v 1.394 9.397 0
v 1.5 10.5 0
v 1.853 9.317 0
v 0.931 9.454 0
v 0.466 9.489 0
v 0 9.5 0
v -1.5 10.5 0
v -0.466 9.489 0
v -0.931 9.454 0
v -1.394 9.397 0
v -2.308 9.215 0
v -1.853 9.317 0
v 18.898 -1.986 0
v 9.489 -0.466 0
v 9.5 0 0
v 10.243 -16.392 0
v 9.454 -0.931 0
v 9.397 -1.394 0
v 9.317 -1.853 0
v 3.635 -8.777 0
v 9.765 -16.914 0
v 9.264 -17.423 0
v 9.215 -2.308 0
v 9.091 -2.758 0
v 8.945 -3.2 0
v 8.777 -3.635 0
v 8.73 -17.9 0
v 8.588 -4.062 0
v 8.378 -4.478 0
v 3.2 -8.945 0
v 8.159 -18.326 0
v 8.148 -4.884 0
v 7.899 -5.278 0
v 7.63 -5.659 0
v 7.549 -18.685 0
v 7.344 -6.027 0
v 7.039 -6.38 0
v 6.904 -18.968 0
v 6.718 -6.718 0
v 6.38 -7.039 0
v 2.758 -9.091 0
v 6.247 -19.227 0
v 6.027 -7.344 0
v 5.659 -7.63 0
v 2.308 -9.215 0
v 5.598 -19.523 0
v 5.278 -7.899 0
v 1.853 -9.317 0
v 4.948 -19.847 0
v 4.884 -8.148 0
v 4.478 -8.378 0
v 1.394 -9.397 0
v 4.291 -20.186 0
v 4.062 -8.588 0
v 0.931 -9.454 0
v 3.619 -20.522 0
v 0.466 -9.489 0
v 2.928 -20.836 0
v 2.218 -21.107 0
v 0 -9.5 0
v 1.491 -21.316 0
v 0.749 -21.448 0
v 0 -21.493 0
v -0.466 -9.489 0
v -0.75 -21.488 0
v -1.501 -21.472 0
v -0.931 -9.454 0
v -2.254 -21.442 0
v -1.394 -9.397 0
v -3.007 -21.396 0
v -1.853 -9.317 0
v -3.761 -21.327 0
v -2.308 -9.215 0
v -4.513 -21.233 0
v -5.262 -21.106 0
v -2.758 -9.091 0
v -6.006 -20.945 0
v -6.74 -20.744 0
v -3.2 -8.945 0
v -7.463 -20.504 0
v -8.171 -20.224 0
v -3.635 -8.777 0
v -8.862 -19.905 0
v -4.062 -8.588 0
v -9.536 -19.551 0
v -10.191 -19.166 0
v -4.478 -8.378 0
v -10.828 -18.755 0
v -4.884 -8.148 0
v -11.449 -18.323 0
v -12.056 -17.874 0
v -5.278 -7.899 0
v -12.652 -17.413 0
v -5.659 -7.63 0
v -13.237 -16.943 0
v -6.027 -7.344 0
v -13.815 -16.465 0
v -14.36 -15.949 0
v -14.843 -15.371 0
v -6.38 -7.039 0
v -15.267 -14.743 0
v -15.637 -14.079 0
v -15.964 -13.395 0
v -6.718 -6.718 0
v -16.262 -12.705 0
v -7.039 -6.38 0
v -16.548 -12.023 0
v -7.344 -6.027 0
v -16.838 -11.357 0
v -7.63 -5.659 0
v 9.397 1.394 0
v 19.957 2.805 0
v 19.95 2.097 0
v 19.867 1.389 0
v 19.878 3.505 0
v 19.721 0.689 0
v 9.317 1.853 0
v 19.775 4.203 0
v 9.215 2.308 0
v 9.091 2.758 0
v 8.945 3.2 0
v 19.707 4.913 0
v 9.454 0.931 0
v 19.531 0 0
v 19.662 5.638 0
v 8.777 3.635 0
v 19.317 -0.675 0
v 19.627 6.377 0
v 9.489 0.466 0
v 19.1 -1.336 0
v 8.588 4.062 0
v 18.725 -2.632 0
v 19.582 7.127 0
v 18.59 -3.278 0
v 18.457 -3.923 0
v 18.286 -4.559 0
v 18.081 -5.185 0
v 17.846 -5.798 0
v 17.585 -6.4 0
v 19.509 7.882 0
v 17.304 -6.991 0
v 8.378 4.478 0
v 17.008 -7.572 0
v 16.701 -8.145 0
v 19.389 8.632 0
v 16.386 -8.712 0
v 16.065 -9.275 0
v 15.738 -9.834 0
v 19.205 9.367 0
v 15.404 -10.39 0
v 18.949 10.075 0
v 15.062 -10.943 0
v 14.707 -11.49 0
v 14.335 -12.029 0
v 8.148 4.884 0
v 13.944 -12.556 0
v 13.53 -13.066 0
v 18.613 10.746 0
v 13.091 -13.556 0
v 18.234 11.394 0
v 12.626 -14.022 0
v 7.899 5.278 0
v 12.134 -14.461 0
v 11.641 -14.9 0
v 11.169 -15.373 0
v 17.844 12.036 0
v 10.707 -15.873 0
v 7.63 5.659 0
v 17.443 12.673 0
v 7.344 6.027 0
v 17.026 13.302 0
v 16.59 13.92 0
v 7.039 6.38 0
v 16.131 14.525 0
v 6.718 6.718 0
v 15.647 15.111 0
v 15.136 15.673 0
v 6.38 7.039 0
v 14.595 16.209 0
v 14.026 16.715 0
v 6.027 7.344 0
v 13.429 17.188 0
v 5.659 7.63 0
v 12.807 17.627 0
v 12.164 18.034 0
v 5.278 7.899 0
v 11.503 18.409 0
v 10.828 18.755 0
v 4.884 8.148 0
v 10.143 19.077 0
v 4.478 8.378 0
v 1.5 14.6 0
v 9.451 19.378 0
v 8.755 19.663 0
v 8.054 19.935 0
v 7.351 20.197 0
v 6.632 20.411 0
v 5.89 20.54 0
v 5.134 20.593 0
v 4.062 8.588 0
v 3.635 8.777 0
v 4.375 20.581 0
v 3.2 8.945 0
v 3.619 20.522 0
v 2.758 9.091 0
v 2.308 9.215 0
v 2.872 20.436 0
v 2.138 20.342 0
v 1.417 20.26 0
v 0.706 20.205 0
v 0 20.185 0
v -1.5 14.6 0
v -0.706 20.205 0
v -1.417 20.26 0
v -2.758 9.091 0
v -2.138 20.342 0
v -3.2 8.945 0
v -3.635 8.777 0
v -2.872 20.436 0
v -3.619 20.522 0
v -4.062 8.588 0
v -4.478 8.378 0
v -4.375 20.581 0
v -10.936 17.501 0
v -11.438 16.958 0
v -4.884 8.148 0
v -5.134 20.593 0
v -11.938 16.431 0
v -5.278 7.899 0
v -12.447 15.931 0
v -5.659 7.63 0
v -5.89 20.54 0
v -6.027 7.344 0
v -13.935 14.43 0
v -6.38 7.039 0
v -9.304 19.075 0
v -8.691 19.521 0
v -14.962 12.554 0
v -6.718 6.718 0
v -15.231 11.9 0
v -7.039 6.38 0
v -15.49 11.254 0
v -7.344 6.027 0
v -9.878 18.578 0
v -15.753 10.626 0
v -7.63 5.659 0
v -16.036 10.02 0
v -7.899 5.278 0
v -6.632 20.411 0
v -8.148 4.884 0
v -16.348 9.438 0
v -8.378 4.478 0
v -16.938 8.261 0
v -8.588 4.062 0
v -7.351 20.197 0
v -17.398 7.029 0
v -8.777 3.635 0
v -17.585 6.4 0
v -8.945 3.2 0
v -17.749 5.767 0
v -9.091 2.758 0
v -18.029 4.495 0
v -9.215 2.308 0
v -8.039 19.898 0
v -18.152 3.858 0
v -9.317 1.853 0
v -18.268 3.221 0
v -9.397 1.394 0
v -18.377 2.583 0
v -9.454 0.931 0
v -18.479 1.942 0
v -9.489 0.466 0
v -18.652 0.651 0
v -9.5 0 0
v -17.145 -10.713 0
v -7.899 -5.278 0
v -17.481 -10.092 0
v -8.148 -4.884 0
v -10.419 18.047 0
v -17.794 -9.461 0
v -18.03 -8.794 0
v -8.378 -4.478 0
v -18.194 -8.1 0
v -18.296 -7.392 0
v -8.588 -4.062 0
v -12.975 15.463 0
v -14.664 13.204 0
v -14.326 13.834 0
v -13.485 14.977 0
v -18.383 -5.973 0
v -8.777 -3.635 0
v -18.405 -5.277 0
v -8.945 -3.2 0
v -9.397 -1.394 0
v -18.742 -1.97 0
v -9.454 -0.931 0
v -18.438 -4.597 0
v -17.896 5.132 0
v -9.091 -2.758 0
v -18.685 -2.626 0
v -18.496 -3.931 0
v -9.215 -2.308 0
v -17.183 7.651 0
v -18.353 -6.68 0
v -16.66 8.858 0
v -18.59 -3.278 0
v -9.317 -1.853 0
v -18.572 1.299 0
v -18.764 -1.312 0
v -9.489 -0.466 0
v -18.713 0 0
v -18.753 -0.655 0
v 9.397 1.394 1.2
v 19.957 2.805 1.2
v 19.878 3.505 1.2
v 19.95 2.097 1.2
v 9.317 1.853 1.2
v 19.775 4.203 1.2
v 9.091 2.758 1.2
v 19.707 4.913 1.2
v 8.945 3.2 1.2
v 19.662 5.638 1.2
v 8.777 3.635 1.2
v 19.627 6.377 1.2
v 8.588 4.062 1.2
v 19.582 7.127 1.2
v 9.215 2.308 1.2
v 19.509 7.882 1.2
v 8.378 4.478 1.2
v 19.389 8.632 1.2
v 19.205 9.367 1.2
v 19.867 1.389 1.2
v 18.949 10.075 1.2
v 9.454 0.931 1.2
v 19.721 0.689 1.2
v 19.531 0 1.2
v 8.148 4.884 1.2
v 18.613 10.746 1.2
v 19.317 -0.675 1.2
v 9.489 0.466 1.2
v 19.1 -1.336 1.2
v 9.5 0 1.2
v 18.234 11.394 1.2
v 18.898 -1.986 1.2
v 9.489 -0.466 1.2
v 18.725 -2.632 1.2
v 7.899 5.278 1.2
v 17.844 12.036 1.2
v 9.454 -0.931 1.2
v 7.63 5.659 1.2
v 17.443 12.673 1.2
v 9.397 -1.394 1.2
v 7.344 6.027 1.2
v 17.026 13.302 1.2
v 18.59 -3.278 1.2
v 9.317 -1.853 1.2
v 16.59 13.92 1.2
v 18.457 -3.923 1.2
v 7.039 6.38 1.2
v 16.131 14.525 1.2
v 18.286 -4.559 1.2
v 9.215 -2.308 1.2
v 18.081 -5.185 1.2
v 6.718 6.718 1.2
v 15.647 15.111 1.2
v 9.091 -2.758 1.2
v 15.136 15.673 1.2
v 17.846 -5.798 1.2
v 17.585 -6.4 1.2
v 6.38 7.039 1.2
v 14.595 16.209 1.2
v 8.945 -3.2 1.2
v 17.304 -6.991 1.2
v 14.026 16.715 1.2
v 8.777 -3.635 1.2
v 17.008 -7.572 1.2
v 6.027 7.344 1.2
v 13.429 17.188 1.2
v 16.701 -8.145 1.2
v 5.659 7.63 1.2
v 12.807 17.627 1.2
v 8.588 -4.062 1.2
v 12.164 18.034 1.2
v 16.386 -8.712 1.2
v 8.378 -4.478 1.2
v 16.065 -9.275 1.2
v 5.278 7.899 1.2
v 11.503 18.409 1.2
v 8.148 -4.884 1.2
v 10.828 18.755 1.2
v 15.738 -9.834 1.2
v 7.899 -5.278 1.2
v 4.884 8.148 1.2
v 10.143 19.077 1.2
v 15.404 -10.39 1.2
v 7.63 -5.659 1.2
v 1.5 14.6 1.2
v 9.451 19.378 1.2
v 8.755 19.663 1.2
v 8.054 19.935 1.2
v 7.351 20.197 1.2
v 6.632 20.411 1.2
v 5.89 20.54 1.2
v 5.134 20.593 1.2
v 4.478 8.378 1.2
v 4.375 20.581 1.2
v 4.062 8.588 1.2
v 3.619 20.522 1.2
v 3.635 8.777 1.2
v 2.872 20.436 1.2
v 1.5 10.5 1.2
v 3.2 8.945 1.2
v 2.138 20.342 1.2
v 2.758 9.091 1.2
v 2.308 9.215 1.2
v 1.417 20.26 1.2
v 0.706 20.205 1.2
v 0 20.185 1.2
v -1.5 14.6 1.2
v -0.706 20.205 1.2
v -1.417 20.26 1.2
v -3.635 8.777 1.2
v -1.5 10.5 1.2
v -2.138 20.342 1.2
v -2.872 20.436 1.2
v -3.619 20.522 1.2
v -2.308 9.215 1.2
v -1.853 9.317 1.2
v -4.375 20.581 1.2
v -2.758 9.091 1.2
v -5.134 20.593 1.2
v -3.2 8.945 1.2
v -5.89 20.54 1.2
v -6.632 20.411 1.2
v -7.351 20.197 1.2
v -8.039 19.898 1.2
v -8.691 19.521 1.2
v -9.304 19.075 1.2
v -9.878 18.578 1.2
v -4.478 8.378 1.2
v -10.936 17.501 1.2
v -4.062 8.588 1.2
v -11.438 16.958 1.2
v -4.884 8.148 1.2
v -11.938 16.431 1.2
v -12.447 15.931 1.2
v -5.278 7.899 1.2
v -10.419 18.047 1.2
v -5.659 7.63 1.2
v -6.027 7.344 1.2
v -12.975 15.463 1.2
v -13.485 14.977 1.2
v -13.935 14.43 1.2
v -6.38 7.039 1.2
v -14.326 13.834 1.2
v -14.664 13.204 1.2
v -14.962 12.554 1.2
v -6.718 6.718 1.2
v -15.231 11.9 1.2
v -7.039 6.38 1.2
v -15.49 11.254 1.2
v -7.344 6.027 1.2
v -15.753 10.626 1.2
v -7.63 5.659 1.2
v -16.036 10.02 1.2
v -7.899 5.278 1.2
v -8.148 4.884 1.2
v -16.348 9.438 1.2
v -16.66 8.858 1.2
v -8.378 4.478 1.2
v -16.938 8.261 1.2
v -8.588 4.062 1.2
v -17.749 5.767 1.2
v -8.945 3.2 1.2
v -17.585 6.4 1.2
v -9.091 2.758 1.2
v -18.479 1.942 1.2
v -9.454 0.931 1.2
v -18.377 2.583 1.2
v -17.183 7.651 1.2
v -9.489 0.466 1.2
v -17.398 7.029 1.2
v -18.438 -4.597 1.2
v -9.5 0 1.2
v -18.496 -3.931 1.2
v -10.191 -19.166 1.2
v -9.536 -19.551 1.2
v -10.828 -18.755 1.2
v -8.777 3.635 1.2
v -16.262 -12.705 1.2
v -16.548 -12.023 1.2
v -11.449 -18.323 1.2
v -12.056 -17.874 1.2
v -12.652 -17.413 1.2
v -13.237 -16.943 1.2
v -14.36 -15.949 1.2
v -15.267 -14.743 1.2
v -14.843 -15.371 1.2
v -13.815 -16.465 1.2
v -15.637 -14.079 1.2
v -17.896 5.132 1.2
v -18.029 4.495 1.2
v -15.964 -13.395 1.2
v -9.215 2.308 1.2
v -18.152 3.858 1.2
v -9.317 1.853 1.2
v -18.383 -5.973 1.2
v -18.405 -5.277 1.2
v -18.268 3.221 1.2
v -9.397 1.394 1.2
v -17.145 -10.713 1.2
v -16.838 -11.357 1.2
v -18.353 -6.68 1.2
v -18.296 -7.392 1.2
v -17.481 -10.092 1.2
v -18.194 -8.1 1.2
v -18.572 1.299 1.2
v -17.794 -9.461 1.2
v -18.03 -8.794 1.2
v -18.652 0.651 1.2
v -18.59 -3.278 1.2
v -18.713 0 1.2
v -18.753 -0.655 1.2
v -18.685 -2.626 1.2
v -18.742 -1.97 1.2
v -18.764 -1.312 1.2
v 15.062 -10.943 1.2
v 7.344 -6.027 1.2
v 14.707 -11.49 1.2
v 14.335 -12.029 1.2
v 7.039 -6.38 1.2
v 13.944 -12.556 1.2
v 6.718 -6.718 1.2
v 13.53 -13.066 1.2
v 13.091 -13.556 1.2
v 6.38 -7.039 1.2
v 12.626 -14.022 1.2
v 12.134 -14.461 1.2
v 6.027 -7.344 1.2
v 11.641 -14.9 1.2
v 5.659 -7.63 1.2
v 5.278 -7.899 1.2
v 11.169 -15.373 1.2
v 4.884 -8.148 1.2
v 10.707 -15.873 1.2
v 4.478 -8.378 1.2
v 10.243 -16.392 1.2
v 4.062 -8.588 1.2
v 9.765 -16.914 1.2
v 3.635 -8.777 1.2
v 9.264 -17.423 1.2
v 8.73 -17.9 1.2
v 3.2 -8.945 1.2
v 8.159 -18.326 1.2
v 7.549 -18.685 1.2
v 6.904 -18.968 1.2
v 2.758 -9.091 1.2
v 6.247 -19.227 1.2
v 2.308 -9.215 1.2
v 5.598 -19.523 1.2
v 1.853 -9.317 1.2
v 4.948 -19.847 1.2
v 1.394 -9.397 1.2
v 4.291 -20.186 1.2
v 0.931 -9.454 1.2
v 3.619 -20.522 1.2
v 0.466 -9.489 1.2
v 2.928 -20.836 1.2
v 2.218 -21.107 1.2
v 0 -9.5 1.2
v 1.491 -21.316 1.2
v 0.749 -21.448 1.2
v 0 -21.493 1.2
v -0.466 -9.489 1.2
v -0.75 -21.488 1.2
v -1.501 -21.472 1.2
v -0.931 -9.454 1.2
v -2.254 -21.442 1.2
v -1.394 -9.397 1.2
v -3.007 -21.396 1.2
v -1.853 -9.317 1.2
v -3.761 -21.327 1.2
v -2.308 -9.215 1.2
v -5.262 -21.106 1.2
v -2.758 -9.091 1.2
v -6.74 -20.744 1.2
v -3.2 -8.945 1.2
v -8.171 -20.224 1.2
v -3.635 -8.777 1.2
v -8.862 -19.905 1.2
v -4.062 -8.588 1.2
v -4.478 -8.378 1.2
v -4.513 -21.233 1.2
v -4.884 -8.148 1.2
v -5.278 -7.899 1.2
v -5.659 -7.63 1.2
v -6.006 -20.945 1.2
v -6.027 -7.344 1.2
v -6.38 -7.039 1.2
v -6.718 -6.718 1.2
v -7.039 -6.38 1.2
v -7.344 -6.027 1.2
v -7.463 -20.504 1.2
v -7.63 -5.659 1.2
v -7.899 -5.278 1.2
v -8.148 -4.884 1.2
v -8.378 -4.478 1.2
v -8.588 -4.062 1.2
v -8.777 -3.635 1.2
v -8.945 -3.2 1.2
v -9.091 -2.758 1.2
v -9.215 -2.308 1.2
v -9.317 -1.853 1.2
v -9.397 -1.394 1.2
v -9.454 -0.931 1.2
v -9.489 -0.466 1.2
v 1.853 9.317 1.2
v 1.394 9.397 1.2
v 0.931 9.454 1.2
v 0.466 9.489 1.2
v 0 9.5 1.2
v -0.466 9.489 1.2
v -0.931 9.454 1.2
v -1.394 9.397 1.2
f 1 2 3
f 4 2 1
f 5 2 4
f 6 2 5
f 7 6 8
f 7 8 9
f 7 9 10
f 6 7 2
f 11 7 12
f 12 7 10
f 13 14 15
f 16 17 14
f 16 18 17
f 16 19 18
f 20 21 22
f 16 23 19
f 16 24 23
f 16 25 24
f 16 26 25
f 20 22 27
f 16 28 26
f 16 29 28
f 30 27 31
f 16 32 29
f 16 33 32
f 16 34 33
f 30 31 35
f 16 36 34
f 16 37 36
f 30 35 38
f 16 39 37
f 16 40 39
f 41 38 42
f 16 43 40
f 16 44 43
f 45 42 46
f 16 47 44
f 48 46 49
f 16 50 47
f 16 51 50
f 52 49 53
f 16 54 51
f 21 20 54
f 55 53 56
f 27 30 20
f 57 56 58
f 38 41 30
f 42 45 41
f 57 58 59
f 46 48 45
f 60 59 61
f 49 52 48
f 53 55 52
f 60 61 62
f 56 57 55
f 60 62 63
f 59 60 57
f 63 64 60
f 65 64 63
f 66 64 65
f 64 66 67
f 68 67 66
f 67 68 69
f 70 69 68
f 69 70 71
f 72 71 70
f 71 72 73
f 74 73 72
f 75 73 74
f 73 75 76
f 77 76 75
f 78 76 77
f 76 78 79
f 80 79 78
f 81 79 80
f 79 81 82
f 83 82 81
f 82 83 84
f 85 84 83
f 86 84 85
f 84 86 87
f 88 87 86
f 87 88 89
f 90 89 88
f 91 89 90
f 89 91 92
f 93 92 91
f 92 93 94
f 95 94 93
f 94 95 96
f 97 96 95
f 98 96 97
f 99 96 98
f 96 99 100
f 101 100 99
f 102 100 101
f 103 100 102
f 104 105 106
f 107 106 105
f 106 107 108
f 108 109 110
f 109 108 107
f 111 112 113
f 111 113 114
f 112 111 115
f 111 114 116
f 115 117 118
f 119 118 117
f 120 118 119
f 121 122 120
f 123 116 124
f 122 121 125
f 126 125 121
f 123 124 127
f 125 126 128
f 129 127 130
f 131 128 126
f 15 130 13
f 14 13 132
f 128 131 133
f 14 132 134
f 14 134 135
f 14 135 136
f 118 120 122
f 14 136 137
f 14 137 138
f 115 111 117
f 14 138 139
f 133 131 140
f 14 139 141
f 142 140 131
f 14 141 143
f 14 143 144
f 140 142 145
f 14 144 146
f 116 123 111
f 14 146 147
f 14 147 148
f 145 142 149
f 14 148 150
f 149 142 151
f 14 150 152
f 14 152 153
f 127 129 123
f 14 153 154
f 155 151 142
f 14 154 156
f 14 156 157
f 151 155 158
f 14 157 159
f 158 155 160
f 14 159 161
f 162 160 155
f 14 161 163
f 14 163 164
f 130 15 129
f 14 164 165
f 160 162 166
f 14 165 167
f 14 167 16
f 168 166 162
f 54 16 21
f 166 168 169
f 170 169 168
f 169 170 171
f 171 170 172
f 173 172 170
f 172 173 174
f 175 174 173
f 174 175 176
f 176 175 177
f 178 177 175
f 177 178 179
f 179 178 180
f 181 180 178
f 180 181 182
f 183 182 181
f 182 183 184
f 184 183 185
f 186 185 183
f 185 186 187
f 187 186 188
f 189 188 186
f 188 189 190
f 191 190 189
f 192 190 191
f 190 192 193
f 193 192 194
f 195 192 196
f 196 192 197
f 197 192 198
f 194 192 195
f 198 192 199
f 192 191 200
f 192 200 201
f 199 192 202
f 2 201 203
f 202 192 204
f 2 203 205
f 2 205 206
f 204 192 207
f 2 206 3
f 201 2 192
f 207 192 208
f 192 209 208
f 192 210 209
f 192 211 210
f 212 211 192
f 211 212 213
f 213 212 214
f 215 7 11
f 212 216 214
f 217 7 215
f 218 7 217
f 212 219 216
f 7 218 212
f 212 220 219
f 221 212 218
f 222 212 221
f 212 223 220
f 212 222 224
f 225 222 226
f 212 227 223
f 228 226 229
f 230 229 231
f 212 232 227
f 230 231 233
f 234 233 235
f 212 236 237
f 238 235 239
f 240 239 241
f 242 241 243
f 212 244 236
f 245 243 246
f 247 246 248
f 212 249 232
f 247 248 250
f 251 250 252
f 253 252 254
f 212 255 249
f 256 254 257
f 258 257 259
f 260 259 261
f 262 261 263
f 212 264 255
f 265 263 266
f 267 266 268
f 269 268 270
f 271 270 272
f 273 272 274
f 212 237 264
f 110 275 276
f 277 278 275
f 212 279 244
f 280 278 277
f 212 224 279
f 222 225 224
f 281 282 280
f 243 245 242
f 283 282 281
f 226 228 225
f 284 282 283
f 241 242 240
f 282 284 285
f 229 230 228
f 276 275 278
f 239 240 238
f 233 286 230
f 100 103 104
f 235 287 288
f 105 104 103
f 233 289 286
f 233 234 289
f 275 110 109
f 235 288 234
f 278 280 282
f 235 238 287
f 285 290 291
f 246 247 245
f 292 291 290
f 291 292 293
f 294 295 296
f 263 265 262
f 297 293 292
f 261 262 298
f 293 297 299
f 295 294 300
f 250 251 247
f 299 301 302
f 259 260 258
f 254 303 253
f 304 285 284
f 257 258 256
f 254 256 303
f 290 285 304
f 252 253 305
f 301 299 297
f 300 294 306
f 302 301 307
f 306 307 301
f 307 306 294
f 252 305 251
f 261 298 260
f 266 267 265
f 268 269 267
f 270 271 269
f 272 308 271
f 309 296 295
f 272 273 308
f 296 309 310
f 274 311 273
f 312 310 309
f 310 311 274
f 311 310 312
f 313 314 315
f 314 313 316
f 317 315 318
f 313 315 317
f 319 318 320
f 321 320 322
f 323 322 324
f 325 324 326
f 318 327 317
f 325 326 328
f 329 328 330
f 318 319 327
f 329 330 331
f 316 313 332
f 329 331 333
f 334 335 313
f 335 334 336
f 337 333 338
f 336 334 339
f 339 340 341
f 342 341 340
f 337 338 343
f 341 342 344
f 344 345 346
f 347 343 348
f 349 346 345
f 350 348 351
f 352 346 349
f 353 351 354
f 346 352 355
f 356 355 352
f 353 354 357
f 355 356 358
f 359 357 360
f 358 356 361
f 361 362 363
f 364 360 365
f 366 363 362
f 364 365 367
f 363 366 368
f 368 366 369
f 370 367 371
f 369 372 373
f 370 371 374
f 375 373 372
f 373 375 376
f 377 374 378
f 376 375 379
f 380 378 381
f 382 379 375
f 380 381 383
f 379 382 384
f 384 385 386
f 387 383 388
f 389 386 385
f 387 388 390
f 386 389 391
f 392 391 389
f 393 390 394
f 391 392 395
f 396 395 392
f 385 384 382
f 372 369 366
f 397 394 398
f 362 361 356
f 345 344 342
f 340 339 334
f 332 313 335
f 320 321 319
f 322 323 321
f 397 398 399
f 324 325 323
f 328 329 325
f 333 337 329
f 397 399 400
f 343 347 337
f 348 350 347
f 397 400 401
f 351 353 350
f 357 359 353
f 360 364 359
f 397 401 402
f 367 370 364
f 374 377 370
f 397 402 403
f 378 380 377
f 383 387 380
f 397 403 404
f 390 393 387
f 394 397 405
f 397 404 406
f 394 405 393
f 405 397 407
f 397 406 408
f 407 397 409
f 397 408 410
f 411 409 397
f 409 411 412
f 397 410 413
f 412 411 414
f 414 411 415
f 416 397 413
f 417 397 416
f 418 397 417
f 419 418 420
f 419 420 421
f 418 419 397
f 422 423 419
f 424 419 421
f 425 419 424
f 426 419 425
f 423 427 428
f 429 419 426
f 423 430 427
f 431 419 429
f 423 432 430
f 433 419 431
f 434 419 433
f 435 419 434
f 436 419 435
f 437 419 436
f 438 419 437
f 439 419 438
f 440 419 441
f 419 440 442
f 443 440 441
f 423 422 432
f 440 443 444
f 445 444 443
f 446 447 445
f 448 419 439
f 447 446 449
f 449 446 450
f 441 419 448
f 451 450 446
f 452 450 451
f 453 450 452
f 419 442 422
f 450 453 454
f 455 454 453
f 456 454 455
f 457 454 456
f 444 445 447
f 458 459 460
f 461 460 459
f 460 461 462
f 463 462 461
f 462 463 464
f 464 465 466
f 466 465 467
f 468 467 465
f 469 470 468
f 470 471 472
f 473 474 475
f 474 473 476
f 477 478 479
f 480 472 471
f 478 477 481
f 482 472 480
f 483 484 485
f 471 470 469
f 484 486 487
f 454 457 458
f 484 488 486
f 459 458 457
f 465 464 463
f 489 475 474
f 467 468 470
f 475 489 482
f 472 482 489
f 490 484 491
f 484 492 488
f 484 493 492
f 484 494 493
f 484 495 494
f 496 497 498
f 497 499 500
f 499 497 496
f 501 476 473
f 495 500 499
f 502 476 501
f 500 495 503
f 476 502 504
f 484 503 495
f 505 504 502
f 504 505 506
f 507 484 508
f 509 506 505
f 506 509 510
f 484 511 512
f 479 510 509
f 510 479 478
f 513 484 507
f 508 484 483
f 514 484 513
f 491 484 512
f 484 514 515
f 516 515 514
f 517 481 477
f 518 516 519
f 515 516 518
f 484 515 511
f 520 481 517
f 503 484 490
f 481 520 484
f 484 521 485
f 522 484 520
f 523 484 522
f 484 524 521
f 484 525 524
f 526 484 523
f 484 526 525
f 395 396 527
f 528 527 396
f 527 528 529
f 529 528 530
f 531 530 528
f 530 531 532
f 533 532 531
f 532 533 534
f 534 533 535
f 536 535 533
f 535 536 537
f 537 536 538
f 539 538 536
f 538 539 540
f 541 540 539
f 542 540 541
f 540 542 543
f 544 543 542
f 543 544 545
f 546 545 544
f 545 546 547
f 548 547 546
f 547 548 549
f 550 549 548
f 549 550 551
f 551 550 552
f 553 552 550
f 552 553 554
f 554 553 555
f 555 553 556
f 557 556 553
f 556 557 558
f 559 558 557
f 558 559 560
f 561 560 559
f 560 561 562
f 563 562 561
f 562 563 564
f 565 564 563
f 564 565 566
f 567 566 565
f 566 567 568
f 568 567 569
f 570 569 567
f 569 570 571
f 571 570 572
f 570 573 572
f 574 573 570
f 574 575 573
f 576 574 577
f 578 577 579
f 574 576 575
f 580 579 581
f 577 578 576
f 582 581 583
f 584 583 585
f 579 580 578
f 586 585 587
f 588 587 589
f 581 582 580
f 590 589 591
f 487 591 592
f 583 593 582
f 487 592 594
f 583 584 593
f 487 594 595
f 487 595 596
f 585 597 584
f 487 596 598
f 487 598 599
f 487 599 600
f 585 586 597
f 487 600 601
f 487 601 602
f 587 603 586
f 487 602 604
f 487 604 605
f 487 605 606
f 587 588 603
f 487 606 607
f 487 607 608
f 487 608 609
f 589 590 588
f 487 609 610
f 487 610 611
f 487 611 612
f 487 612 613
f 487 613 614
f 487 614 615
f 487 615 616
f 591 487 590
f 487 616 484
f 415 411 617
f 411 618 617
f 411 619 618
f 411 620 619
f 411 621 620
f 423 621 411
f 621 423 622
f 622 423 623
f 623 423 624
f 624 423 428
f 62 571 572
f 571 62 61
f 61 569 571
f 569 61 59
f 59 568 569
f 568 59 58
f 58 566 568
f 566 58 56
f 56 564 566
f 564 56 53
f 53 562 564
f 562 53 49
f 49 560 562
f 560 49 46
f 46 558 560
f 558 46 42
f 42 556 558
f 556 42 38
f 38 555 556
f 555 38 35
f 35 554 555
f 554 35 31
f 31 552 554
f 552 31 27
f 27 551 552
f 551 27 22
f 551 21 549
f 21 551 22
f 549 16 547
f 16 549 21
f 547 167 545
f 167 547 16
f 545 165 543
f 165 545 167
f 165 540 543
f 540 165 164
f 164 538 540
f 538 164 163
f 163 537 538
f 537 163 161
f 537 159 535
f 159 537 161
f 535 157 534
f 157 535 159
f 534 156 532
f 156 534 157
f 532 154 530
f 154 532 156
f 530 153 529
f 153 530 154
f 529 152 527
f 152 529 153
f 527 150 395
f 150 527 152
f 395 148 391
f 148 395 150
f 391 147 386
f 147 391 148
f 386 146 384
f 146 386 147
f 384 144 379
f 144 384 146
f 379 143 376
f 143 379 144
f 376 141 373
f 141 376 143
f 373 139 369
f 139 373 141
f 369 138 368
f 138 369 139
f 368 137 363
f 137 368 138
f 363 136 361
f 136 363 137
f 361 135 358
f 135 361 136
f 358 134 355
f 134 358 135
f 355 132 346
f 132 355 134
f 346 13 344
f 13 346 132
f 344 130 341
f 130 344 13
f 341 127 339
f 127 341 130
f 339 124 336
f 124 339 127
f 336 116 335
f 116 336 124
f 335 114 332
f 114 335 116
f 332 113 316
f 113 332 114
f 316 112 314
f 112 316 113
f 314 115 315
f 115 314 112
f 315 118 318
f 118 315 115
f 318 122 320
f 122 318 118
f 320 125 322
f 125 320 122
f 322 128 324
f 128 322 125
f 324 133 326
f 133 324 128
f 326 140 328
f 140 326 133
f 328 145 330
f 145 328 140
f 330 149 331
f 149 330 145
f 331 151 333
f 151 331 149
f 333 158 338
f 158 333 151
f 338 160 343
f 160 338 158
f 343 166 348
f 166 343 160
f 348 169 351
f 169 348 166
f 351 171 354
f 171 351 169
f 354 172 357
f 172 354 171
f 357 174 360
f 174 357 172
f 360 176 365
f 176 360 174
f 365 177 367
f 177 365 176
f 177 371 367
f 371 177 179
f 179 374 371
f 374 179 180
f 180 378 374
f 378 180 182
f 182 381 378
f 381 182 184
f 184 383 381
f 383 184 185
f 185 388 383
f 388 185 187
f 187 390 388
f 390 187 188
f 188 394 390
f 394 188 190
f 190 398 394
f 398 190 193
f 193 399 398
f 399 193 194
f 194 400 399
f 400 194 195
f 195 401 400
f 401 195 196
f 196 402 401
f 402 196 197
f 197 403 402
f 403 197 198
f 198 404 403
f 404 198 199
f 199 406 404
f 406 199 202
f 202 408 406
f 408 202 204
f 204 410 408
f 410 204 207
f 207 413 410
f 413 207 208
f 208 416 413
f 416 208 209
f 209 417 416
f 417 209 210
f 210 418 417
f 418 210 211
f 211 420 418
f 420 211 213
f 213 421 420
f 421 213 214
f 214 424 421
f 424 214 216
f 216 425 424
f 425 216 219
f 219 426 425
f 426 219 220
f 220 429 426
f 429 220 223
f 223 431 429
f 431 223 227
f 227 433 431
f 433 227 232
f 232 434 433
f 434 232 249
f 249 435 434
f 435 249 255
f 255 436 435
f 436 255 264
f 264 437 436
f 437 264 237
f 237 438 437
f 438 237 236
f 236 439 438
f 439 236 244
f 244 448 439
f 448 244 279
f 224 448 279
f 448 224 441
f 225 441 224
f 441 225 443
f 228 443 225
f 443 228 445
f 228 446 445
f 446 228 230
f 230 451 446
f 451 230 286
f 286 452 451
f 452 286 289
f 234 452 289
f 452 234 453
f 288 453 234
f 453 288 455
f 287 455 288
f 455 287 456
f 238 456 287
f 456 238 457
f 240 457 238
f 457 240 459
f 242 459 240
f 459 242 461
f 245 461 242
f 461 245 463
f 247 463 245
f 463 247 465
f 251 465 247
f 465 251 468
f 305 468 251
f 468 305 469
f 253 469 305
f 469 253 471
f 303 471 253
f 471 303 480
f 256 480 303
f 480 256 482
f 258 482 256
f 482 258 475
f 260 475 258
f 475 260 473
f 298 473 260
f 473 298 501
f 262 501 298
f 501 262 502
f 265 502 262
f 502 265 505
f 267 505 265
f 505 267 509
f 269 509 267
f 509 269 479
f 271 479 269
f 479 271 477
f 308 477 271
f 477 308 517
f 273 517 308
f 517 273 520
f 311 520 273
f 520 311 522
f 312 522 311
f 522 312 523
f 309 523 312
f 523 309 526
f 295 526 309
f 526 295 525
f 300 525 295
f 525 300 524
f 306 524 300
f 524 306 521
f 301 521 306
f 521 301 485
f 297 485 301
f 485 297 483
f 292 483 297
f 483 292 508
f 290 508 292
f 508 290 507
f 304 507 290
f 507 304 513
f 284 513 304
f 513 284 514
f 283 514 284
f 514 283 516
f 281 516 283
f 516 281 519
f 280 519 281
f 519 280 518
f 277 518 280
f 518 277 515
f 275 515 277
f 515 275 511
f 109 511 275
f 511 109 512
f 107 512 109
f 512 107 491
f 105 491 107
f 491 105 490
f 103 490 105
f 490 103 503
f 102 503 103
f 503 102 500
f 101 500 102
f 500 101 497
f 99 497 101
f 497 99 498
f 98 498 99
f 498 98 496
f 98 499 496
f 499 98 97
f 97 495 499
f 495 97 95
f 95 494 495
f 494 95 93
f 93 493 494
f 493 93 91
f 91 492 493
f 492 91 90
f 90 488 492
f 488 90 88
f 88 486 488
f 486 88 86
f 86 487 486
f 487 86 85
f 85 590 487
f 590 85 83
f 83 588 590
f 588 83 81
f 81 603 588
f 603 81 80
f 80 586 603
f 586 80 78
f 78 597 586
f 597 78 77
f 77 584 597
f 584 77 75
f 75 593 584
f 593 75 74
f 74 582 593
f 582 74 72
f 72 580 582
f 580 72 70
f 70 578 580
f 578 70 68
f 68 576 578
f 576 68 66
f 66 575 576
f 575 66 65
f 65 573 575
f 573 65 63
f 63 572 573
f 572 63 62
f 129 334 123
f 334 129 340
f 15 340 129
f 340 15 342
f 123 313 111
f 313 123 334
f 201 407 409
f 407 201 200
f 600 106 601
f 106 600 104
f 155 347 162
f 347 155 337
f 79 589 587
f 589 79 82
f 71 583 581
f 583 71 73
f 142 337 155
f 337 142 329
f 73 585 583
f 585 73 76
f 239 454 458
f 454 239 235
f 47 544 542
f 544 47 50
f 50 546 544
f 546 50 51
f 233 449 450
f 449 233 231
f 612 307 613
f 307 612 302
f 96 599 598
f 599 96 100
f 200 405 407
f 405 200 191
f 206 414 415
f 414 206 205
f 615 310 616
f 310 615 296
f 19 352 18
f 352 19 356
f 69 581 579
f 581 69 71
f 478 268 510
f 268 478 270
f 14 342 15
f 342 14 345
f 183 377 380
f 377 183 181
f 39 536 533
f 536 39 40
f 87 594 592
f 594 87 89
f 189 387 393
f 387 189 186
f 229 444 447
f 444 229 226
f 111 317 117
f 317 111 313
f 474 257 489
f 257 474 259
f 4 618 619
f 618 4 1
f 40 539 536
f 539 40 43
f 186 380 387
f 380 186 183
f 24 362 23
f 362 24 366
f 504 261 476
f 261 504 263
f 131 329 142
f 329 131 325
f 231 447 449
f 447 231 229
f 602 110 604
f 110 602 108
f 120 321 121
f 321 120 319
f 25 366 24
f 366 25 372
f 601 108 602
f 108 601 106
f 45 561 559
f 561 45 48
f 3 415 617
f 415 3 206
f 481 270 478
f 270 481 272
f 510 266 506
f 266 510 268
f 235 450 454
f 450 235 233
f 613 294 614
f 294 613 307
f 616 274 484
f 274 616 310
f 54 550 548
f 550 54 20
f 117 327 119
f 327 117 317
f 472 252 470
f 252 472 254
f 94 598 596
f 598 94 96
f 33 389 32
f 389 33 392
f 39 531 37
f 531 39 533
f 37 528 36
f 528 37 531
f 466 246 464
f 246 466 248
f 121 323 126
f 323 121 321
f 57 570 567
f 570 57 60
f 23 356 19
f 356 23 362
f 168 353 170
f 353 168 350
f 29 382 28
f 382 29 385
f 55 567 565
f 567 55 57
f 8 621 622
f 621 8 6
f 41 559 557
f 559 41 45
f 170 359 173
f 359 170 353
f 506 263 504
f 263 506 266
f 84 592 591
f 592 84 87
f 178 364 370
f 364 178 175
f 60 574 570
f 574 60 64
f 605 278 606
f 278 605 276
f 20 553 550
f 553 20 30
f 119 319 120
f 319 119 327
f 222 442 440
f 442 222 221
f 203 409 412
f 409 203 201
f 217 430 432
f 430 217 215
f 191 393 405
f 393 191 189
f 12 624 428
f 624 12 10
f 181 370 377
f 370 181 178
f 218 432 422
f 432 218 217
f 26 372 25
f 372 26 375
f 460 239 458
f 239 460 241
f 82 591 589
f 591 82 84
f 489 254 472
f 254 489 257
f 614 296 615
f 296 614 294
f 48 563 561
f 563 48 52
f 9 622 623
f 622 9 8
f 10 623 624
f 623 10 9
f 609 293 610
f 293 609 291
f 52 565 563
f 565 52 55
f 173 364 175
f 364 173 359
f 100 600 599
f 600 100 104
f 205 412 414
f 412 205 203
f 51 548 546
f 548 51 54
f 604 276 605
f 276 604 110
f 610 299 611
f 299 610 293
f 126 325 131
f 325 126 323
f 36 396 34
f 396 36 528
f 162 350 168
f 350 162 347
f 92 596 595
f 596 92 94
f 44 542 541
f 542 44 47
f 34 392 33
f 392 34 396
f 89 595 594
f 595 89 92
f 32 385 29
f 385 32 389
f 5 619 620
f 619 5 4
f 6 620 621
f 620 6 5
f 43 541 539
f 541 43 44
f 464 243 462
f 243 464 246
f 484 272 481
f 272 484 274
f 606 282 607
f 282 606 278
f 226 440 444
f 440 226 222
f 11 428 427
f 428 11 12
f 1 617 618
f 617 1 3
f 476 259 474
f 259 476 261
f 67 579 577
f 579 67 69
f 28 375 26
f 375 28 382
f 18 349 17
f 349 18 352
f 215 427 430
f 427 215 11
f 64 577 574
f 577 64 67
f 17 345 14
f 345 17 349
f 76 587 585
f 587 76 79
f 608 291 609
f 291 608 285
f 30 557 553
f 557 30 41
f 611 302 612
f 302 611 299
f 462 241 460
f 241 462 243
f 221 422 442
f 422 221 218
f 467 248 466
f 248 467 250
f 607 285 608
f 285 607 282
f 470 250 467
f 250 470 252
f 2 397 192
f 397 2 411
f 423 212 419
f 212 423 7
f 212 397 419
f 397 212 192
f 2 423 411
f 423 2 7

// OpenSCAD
/*
  Elna Supermatic cam 17
  Name: Round pulses
  Status: candidate

  Generated from measured parametric base v2.
  Surface mode: smooth
*/

include <_elna_measured_common.scad>;

profile_points = [
        [0.0000, 20.1850],
        [0.7056, 20.2047],
        [1.4167, 20.2604],
        [2.1381, 20.3425],
        [2.8721, 20.4361],
        [3.6187, 20.5224],
        [4.3747, 20.5813],
        [5.1344, 20.5930],
        [5.8898, 20.5403],
        [6.6318, 20.4106],
        [7.3510, 20.1968],
        [8.0544, 19.9354],
        [8.7547, 19.6634],
        [9.4515, 19.3784],
        [10.1434, 19.0769],
        [10.8282, 18.7551],
        [11.5030, 18.4086],
        [12.1639, 18.0337],
        [12.8071, 17.6275],
        [13.4288, 17.1881],
        [14.0256, 16.7151],
        [14.5951, 16.2095],
        [15.1358, 15.6735],
        [15.6475, 15.1106],
        [16.1315, 14.5248],
        [16.5898, 13.9205],
        [17.0257, 13.3020],
        [17.4427, 12.6729],
        [17.8444, 12.0362],
        [18.2339, 11.3938],
        [18.6135, 10.7465],
        [18.9489, 10.0753],
        [19.2055, 9.3672],
        [19.3886, 8.6323],
        [19.5090, 7.8821],
        [19.5823, 7.1274],
        [19.6269, 6.3772],
        [19.6622, 5.6380],
        [19.7066, 4.9134],
        [19.7752, 4.2034],
        [19.8783, 3.5051],
        [19.9569, 2.8048],
        [19.9502, 2.0969],
        [19.8669, 1.3892],
        [19.7211, 0.6887],
        [19.5310, 0.0000],
        [19.3171, -0.6746],
        [19.0999, -1.3356],
        [18.8978, -1.9862],
        [18.7250, -2.6316],
        [18.5902, -3.2780],
        [18.4567, -3.9231],
        [18.2860, -4.5592],
        [18.0810, -5.1846],
        [17.8456, -5.7984],
        [17.5849, -6.4004],
        [17.3040, -6.9913],
        [17.0078, -7.5724],
        [16.7007, -8.1455],
        [16.3857, -8.7125],
        [16.0648, -9.2750],
        [15.7381, -9.8342],
        [15.4045, -10.3905],
        [15.0618, -10.9430],
        [14.7066, -11.4901],
        [14.3354, -12.0288],
        [13.9444, -12.5556],
        [13.5305, -13.0662],
        [13.0914, -13.5565],
        [12.6258, -14.0224],
        [12.1339, -14.4606],
        [11.6415, -14.9005],
        [11.1690, -15.3729],
        [10.7066, -15.8732],
        [10.2428, -16.3918],
        [9.7655, -16.9143],
        [9.2641, -17.4233],
        [8.7303, -17.8999],
        [8.1592, -18.3258],
        [7.5494, -18.6855],
        [6.9037, -18.9677],
        [6.2474, -19.2275],
        [5.5982, -19.5231],
        [4.9484, -19.8470],
        [4.2907, -20.1859],
        [3.6187, -20.5224],
        [2.9284, -20.8363],
        [2.2185, -21.1071],
        [1.4906, -21.3160],
        [0.7490, -21.4479],
        [0.0000, -21.4930],
        [-0.7504, -21.4879],
        [-1.5015, -21.4718],
        [-2.2537, -21.4423],
        [-3.0070, -21.3957],
        [-3.7606, -21.3275],
        [-4.5131, -21.2327],
        [-5.2624, -21.1065],
        [-6.0058, -20.9447],
        [-6.7403, -20.7444],
        [-7.4629, -20.5041],
        [-8.1709, -20.2237],
        [-8.8623, -19.9050],
        [-9.5357, -19.5511],
        [-10.1908, -19.1662],
        [-10.8283, -18.7551],
        [-11.4494, -18.3229],
        [-12.0564, -17.8744],
        [-12.6516, -17.4135],
        [-13.2373, -16.9430],
        [-13.8154, -16.4646],
        [-14.3602, -15.9486],
        [-14.8435, -15.3709],
        [-15.2668, -14.7430],
        [-15.6366, -14.0792],
        [-15.9636, -13.3951],
        [-16.2621, -12.7053],
        [-16.5481, -12.0229],
        [-16.8377, -11.3572],
        [-17.1450, -10.7134],
        [-17.4807, -10.0925],
        [-17.7940, -9.4613],
        [-18.0299, -8.7938],
        [-18.1936, -8.1003],
        [-18.2962, -7.3921],
        [-18.3531, -6.6800],
        [-18.3829, -5.9730],
        [-18.4049, -5.2775],
        [-18.4375, -4.5970],
        [-18.4958, -3.9314],
        [-18.5902, -3.2780],
        [-18.6854, -2.6261],
        [-18.7425, -1.9699],
        [-18.7638, -1.3121],
        [-18.7526, -0.6549],
        [-18.7135, -0.0000],
        [-18.6516, 0.6513],
        [-18.5720, 1.2987],
        [-18.4794, 1.9423],
        [-18.3774, 2.5828],
        [-18.2682, 3.2212],
        [-18.1525, 3.8584],
        [-18.0293, 4.4952],
        [-17.8962, 5.1317],
        [-17.7495, 5.7672],
        [-17.5849, 6.4004],
        [-17.3977, 7.0291],
        [-17.1834, 7.6506],
        [-16.9385, 8.2614],
        [-16.6603, 8.8585],
        [-16.3480, 9.4385],
        [-16.0357, 10.0202],
        [-15.7533, 10.6257],
        [-15.4899, 11.2541],
        [-15.2314, 11.9001],
        [-14.9616, 12.5543],
        [-14.6645, 13.2040],
        [-14.3259, 13.8344],
        [-13.9349, 14.4300],
        [-13.4850, 14.9766],
        [-12.9747, 15.4626],
        [-12.4468, 15.9312],
        [-11.9379, 16.4311],
        [-11.4381, 16.9576],
        [-10.9359, 17.5011],
        [-10.4195, 18.0471],
        [-9.8782, 18.5782],
        [-9.3037, 19.0755],
        [-8.6912, 19.5207],
        [-8.0394, 19.8983],
        [-7.3510, 20.1968],
        [-6.6318, 20.4106],
        [-5.8898, 20.5403],
        [-5.1344, 20.5930],
        [-4.3747, 20.5813],
        [-3.6187, 20.5224],
        [-2.8721, 20.4361],
        [-2.1381, 20.3425],
        [-1.4167, 20.2604],
        [-0.7056, 20.2047]
];

icon_points = [[-1.000,0.200], [-0.880,0.620], [-0.760,0.860], [-0.640,0.620], [-0.520,0.200], [-0.300,0.200], [-0.180,0.620], [-0.060,0.860], [0.060,0.620], [0.180,0.200], [0.400,0.200], [0.520,0.620], [0.640,0.860], [0.760,0.620], [0.880,0.200], [1.000,0.200]];

elna_cam_ring(profile_points=profile_points);
